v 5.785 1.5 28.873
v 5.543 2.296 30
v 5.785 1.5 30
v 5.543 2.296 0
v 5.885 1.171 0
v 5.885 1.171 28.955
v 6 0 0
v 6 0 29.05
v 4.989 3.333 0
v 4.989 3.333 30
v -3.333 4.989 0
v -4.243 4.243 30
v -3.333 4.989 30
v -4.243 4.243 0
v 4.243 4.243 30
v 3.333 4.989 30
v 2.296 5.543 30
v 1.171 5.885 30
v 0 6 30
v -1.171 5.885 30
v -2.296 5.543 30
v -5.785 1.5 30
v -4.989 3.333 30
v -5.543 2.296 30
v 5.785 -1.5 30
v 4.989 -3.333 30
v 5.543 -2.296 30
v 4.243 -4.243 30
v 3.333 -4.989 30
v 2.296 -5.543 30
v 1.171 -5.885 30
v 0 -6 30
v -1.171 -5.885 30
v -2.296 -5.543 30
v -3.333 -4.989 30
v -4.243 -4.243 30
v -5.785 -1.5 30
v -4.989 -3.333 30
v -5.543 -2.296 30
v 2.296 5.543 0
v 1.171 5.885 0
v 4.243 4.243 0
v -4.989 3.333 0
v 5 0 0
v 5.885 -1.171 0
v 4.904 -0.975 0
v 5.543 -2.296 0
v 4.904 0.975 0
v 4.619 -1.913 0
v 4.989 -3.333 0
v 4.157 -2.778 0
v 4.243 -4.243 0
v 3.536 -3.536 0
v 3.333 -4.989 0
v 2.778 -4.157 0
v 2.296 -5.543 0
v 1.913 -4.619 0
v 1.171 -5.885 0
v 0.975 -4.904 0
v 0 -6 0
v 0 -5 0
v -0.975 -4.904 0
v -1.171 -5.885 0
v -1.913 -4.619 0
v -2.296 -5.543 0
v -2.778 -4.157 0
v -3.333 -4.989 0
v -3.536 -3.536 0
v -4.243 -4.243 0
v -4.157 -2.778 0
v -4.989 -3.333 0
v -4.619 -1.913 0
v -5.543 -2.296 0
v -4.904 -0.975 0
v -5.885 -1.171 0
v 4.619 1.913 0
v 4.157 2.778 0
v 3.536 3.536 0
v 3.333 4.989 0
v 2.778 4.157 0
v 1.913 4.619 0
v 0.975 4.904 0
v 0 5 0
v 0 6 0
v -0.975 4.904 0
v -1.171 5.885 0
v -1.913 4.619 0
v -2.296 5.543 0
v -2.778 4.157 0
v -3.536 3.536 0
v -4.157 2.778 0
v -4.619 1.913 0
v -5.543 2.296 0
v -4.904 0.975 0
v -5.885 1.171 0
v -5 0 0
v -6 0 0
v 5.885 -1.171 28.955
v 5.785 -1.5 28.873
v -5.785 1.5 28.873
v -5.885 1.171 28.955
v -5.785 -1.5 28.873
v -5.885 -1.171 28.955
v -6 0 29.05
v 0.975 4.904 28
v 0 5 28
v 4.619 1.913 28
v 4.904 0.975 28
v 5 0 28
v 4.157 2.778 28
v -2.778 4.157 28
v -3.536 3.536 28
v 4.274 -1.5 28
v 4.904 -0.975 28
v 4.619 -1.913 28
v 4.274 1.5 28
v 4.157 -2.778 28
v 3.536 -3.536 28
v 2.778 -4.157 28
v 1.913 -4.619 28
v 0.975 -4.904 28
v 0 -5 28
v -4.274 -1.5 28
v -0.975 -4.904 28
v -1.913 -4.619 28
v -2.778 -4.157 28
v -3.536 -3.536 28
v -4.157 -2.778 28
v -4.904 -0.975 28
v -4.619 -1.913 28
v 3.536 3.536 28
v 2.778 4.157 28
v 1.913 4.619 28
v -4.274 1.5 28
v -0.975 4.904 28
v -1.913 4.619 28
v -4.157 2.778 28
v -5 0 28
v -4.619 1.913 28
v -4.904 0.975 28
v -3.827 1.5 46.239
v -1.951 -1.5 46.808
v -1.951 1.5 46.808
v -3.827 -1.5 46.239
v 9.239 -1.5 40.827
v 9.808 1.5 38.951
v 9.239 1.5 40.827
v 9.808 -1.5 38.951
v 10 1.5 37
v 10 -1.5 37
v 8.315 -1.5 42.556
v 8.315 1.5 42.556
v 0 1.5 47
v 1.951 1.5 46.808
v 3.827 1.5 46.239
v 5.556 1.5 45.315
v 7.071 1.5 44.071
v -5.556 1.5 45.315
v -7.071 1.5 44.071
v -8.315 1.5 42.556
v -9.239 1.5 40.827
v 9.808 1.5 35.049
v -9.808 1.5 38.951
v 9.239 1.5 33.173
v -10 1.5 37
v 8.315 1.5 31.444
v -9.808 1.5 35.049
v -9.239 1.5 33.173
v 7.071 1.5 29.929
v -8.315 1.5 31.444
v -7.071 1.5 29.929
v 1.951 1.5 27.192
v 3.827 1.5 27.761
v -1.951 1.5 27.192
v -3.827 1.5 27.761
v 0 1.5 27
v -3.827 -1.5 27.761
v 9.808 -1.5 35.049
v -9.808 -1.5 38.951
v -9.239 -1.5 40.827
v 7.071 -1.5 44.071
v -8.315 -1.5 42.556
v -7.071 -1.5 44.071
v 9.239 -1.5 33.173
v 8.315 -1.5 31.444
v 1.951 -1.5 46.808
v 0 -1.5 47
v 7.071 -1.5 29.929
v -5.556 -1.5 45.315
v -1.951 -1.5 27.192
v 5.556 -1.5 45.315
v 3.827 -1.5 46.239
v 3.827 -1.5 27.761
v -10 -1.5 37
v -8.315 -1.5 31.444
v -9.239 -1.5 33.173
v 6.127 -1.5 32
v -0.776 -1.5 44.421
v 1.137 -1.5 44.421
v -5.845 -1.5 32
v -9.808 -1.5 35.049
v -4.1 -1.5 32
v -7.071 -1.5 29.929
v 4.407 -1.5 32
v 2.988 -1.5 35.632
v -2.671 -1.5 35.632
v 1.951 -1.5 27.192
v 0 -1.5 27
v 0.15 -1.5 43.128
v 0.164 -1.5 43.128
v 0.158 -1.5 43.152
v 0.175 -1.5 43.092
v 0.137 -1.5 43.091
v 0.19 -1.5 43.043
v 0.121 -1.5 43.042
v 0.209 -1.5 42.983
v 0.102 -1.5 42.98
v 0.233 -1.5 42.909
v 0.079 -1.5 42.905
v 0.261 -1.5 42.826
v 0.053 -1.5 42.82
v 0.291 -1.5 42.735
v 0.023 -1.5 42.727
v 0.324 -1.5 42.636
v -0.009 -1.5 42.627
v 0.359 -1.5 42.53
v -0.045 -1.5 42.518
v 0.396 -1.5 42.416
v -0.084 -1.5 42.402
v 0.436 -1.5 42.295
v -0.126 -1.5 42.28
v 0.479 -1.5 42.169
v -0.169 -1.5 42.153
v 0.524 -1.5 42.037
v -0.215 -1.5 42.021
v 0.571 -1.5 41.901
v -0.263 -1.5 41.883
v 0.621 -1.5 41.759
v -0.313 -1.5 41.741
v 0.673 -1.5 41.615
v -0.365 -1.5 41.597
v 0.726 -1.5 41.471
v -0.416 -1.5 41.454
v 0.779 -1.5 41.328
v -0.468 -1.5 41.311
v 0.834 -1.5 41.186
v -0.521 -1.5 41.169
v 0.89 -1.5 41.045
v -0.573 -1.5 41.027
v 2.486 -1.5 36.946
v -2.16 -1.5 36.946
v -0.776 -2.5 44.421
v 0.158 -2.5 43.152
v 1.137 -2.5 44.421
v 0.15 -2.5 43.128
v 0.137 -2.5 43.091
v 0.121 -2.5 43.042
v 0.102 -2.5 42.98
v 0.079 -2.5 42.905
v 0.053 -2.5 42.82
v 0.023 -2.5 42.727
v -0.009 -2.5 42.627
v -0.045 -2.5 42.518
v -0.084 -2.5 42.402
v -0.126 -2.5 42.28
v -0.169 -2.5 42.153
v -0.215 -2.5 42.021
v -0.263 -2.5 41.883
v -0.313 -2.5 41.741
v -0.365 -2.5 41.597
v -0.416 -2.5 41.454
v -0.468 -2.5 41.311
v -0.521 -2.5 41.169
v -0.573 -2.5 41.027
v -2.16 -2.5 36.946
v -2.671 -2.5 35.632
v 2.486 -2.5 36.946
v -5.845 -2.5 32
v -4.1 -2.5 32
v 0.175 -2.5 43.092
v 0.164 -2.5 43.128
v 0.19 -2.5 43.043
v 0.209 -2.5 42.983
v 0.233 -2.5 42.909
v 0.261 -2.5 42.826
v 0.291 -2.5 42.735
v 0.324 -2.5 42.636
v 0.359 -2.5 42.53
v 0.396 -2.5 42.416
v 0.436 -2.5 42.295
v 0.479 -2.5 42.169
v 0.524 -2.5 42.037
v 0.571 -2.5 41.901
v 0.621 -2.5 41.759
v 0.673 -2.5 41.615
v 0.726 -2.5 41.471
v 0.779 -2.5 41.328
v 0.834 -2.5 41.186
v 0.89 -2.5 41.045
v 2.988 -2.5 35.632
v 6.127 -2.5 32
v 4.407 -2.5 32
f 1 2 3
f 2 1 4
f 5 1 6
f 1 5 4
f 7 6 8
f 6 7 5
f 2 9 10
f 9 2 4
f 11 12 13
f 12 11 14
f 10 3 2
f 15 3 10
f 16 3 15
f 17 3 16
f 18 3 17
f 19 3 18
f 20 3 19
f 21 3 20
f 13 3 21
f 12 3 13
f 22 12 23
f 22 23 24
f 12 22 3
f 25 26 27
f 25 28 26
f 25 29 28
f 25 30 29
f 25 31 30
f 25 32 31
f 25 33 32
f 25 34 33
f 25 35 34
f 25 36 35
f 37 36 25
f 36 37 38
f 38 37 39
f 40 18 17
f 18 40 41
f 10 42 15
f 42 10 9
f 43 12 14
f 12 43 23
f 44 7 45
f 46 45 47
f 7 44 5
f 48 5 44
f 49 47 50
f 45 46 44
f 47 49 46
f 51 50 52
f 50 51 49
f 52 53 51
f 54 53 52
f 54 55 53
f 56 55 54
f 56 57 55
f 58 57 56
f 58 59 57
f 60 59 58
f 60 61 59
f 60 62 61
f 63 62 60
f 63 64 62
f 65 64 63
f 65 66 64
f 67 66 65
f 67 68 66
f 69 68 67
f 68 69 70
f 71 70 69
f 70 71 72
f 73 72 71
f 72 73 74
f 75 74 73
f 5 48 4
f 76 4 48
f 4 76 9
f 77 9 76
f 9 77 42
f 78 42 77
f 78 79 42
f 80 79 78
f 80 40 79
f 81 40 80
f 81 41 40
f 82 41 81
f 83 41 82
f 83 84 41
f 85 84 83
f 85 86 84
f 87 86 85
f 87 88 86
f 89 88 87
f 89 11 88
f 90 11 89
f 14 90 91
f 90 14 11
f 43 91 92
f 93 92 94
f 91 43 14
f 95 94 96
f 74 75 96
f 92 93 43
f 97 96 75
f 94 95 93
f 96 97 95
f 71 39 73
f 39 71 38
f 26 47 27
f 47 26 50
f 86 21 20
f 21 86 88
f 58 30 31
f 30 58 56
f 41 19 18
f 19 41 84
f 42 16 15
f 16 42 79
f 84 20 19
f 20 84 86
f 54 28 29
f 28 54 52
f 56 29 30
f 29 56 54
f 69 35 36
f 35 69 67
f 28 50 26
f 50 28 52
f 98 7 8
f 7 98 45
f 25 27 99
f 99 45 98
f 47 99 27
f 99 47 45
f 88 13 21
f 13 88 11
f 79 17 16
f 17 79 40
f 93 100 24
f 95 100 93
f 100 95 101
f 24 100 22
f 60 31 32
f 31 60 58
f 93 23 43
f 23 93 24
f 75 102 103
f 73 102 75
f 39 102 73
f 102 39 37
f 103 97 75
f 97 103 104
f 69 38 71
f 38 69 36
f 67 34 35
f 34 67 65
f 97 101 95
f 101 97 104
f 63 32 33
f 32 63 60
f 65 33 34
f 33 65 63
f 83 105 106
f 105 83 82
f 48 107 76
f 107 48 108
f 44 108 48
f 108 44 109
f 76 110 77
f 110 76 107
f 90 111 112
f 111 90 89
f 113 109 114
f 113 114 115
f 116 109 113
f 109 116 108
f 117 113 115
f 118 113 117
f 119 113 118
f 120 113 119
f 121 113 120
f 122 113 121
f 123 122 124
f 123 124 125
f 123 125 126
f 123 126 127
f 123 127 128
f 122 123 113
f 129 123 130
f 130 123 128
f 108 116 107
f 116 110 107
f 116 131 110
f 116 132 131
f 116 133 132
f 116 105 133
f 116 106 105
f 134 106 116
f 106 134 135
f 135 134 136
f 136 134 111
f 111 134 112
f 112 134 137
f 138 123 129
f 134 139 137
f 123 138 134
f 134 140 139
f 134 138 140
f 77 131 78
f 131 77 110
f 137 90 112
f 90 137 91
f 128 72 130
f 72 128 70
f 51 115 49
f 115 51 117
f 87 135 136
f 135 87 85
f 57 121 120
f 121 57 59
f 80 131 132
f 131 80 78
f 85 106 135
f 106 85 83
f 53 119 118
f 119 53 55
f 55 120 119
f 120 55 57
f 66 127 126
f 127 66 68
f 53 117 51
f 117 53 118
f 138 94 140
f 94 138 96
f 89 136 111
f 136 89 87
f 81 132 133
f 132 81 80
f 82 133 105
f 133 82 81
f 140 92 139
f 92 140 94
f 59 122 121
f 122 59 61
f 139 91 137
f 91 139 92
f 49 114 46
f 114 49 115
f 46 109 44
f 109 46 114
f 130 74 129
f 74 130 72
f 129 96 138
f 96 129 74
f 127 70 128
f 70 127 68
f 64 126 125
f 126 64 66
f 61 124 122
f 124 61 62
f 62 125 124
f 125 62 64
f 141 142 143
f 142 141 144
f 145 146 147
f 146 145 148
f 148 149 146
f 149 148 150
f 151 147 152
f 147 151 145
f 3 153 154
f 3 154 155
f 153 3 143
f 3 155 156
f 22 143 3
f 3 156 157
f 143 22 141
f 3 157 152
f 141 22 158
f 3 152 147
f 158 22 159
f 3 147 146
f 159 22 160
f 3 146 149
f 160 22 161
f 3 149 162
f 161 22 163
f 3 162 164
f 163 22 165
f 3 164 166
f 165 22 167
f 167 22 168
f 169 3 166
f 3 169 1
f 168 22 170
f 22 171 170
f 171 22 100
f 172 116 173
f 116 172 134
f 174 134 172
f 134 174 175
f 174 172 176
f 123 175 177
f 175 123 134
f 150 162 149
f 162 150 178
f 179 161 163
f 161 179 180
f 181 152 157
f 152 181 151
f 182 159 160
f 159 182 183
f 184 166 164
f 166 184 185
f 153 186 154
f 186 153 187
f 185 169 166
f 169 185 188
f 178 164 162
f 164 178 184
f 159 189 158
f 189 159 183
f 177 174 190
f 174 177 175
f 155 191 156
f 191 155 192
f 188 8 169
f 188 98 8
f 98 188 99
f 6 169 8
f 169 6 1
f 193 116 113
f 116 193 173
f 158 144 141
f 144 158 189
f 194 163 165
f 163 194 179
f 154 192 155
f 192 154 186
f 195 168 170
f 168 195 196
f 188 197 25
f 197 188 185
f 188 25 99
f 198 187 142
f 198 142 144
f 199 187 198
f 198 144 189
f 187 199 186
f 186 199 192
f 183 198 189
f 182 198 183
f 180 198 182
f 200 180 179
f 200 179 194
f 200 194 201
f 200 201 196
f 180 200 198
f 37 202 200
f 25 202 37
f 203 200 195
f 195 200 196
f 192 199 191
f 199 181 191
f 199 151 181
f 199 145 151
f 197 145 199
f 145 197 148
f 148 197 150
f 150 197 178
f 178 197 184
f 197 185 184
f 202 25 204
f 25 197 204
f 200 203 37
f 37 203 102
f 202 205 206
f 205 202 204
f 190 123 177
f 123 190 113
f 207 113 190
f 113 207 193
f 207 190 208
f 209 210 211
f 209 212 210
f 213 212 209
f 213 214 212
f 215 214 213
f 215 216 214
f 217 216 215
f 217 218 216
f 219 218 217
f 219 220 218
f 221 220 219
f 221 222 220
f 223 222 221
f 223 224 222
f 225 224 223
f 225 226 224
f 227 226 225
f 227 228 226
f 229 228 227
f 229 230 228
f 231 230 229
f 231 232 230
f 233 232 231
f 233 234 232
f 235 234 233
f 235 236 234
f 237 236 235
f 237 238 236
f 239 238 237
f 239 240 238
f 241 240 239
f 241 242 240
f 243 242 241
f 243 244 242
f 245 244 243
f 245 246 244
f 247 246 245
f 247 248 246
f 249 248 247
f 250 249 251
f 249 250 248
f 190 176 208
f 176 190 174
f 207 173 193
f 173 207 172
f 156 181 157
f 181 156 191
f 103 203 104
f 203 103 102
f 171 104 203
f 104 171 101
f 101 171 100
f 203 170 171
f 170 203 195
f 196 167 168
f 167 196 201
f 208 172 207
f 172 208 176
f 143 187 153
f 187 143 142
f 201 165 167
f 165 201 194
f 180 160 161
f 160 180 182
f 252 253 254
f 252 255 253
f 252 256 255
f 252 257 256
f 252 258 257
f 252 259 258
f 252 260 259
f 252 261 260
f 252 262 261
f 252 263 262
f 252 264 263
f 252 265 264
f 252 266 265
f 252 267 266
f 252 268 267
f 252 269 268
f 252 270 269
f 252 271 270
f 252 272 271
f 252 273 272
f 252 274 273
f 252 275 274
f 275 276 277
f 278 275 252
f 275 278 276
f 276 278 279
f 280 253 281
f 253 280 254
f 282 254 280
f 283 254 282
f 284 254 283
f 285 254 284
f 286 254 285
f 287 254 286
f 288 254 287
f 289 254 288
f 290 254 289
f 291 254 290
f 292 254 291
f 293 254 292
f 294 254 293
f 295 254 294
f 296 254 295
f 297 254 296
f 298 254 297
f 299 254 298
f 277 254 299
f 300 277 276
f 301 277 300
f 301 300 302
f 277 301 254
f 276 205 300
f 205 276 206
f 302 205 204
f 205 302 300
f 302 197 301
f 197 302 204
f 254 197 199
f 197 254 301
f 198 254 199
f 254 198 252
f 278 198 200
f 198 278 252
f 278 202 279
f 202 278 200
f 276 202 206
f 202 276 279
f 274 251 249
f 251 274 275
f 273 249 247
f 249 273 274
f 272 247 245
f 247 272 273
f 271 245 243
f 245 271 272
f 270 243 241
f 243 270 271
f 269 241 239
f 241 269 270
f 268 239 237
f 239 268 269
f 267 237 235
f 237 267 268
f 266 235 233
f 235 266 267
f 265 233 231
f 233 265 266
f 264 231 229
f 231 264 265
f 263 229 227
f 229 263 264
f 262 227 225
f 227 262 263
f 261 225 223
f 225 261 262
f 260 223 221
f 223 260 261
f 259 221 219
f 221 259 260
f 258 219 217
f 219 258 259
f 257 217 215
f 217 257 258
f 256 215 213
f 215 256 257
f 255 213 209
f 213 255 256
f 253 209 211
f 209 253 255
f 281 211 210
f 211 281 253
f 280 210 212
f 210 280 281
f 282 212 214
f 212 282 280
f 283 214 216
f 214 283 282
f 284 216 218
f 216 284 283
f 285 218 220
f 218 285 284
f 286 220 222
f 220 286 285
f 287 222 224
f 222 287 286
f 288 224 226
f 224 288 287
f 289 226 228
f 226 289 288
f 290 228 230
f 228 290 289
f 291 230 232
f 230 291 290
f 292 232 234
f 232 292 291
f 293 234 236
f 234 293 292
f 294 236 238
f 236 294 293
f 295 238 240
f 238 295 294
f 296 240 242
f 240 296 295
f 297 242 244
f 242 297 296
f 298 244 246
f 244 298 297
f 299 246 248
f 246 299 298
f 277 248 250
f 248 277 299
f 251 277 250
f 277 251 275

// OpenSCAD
// Symbol to use
letter = "A";
// Diameter of the pencil
diameter = 10; // [5:1:15]

$fn=32;

PenCap(letter, diameter);

module PenCap(letter="A", diameter=8) {
    difference() {
        cylinder(h=30, d=diameter+2);
        translate([0,0,-2]) cylinder(h=30, d=diameter);
    }
    translate([-9,1.5,28]) rotate([90,0,0]) {
        translate([9,9,0]) cylinder(h=3, d=20);
        color("Blue") translate([9,4,1]) {
            linear_extrude(3) text(letter, size=13, halign="center");
        }
    }
}
